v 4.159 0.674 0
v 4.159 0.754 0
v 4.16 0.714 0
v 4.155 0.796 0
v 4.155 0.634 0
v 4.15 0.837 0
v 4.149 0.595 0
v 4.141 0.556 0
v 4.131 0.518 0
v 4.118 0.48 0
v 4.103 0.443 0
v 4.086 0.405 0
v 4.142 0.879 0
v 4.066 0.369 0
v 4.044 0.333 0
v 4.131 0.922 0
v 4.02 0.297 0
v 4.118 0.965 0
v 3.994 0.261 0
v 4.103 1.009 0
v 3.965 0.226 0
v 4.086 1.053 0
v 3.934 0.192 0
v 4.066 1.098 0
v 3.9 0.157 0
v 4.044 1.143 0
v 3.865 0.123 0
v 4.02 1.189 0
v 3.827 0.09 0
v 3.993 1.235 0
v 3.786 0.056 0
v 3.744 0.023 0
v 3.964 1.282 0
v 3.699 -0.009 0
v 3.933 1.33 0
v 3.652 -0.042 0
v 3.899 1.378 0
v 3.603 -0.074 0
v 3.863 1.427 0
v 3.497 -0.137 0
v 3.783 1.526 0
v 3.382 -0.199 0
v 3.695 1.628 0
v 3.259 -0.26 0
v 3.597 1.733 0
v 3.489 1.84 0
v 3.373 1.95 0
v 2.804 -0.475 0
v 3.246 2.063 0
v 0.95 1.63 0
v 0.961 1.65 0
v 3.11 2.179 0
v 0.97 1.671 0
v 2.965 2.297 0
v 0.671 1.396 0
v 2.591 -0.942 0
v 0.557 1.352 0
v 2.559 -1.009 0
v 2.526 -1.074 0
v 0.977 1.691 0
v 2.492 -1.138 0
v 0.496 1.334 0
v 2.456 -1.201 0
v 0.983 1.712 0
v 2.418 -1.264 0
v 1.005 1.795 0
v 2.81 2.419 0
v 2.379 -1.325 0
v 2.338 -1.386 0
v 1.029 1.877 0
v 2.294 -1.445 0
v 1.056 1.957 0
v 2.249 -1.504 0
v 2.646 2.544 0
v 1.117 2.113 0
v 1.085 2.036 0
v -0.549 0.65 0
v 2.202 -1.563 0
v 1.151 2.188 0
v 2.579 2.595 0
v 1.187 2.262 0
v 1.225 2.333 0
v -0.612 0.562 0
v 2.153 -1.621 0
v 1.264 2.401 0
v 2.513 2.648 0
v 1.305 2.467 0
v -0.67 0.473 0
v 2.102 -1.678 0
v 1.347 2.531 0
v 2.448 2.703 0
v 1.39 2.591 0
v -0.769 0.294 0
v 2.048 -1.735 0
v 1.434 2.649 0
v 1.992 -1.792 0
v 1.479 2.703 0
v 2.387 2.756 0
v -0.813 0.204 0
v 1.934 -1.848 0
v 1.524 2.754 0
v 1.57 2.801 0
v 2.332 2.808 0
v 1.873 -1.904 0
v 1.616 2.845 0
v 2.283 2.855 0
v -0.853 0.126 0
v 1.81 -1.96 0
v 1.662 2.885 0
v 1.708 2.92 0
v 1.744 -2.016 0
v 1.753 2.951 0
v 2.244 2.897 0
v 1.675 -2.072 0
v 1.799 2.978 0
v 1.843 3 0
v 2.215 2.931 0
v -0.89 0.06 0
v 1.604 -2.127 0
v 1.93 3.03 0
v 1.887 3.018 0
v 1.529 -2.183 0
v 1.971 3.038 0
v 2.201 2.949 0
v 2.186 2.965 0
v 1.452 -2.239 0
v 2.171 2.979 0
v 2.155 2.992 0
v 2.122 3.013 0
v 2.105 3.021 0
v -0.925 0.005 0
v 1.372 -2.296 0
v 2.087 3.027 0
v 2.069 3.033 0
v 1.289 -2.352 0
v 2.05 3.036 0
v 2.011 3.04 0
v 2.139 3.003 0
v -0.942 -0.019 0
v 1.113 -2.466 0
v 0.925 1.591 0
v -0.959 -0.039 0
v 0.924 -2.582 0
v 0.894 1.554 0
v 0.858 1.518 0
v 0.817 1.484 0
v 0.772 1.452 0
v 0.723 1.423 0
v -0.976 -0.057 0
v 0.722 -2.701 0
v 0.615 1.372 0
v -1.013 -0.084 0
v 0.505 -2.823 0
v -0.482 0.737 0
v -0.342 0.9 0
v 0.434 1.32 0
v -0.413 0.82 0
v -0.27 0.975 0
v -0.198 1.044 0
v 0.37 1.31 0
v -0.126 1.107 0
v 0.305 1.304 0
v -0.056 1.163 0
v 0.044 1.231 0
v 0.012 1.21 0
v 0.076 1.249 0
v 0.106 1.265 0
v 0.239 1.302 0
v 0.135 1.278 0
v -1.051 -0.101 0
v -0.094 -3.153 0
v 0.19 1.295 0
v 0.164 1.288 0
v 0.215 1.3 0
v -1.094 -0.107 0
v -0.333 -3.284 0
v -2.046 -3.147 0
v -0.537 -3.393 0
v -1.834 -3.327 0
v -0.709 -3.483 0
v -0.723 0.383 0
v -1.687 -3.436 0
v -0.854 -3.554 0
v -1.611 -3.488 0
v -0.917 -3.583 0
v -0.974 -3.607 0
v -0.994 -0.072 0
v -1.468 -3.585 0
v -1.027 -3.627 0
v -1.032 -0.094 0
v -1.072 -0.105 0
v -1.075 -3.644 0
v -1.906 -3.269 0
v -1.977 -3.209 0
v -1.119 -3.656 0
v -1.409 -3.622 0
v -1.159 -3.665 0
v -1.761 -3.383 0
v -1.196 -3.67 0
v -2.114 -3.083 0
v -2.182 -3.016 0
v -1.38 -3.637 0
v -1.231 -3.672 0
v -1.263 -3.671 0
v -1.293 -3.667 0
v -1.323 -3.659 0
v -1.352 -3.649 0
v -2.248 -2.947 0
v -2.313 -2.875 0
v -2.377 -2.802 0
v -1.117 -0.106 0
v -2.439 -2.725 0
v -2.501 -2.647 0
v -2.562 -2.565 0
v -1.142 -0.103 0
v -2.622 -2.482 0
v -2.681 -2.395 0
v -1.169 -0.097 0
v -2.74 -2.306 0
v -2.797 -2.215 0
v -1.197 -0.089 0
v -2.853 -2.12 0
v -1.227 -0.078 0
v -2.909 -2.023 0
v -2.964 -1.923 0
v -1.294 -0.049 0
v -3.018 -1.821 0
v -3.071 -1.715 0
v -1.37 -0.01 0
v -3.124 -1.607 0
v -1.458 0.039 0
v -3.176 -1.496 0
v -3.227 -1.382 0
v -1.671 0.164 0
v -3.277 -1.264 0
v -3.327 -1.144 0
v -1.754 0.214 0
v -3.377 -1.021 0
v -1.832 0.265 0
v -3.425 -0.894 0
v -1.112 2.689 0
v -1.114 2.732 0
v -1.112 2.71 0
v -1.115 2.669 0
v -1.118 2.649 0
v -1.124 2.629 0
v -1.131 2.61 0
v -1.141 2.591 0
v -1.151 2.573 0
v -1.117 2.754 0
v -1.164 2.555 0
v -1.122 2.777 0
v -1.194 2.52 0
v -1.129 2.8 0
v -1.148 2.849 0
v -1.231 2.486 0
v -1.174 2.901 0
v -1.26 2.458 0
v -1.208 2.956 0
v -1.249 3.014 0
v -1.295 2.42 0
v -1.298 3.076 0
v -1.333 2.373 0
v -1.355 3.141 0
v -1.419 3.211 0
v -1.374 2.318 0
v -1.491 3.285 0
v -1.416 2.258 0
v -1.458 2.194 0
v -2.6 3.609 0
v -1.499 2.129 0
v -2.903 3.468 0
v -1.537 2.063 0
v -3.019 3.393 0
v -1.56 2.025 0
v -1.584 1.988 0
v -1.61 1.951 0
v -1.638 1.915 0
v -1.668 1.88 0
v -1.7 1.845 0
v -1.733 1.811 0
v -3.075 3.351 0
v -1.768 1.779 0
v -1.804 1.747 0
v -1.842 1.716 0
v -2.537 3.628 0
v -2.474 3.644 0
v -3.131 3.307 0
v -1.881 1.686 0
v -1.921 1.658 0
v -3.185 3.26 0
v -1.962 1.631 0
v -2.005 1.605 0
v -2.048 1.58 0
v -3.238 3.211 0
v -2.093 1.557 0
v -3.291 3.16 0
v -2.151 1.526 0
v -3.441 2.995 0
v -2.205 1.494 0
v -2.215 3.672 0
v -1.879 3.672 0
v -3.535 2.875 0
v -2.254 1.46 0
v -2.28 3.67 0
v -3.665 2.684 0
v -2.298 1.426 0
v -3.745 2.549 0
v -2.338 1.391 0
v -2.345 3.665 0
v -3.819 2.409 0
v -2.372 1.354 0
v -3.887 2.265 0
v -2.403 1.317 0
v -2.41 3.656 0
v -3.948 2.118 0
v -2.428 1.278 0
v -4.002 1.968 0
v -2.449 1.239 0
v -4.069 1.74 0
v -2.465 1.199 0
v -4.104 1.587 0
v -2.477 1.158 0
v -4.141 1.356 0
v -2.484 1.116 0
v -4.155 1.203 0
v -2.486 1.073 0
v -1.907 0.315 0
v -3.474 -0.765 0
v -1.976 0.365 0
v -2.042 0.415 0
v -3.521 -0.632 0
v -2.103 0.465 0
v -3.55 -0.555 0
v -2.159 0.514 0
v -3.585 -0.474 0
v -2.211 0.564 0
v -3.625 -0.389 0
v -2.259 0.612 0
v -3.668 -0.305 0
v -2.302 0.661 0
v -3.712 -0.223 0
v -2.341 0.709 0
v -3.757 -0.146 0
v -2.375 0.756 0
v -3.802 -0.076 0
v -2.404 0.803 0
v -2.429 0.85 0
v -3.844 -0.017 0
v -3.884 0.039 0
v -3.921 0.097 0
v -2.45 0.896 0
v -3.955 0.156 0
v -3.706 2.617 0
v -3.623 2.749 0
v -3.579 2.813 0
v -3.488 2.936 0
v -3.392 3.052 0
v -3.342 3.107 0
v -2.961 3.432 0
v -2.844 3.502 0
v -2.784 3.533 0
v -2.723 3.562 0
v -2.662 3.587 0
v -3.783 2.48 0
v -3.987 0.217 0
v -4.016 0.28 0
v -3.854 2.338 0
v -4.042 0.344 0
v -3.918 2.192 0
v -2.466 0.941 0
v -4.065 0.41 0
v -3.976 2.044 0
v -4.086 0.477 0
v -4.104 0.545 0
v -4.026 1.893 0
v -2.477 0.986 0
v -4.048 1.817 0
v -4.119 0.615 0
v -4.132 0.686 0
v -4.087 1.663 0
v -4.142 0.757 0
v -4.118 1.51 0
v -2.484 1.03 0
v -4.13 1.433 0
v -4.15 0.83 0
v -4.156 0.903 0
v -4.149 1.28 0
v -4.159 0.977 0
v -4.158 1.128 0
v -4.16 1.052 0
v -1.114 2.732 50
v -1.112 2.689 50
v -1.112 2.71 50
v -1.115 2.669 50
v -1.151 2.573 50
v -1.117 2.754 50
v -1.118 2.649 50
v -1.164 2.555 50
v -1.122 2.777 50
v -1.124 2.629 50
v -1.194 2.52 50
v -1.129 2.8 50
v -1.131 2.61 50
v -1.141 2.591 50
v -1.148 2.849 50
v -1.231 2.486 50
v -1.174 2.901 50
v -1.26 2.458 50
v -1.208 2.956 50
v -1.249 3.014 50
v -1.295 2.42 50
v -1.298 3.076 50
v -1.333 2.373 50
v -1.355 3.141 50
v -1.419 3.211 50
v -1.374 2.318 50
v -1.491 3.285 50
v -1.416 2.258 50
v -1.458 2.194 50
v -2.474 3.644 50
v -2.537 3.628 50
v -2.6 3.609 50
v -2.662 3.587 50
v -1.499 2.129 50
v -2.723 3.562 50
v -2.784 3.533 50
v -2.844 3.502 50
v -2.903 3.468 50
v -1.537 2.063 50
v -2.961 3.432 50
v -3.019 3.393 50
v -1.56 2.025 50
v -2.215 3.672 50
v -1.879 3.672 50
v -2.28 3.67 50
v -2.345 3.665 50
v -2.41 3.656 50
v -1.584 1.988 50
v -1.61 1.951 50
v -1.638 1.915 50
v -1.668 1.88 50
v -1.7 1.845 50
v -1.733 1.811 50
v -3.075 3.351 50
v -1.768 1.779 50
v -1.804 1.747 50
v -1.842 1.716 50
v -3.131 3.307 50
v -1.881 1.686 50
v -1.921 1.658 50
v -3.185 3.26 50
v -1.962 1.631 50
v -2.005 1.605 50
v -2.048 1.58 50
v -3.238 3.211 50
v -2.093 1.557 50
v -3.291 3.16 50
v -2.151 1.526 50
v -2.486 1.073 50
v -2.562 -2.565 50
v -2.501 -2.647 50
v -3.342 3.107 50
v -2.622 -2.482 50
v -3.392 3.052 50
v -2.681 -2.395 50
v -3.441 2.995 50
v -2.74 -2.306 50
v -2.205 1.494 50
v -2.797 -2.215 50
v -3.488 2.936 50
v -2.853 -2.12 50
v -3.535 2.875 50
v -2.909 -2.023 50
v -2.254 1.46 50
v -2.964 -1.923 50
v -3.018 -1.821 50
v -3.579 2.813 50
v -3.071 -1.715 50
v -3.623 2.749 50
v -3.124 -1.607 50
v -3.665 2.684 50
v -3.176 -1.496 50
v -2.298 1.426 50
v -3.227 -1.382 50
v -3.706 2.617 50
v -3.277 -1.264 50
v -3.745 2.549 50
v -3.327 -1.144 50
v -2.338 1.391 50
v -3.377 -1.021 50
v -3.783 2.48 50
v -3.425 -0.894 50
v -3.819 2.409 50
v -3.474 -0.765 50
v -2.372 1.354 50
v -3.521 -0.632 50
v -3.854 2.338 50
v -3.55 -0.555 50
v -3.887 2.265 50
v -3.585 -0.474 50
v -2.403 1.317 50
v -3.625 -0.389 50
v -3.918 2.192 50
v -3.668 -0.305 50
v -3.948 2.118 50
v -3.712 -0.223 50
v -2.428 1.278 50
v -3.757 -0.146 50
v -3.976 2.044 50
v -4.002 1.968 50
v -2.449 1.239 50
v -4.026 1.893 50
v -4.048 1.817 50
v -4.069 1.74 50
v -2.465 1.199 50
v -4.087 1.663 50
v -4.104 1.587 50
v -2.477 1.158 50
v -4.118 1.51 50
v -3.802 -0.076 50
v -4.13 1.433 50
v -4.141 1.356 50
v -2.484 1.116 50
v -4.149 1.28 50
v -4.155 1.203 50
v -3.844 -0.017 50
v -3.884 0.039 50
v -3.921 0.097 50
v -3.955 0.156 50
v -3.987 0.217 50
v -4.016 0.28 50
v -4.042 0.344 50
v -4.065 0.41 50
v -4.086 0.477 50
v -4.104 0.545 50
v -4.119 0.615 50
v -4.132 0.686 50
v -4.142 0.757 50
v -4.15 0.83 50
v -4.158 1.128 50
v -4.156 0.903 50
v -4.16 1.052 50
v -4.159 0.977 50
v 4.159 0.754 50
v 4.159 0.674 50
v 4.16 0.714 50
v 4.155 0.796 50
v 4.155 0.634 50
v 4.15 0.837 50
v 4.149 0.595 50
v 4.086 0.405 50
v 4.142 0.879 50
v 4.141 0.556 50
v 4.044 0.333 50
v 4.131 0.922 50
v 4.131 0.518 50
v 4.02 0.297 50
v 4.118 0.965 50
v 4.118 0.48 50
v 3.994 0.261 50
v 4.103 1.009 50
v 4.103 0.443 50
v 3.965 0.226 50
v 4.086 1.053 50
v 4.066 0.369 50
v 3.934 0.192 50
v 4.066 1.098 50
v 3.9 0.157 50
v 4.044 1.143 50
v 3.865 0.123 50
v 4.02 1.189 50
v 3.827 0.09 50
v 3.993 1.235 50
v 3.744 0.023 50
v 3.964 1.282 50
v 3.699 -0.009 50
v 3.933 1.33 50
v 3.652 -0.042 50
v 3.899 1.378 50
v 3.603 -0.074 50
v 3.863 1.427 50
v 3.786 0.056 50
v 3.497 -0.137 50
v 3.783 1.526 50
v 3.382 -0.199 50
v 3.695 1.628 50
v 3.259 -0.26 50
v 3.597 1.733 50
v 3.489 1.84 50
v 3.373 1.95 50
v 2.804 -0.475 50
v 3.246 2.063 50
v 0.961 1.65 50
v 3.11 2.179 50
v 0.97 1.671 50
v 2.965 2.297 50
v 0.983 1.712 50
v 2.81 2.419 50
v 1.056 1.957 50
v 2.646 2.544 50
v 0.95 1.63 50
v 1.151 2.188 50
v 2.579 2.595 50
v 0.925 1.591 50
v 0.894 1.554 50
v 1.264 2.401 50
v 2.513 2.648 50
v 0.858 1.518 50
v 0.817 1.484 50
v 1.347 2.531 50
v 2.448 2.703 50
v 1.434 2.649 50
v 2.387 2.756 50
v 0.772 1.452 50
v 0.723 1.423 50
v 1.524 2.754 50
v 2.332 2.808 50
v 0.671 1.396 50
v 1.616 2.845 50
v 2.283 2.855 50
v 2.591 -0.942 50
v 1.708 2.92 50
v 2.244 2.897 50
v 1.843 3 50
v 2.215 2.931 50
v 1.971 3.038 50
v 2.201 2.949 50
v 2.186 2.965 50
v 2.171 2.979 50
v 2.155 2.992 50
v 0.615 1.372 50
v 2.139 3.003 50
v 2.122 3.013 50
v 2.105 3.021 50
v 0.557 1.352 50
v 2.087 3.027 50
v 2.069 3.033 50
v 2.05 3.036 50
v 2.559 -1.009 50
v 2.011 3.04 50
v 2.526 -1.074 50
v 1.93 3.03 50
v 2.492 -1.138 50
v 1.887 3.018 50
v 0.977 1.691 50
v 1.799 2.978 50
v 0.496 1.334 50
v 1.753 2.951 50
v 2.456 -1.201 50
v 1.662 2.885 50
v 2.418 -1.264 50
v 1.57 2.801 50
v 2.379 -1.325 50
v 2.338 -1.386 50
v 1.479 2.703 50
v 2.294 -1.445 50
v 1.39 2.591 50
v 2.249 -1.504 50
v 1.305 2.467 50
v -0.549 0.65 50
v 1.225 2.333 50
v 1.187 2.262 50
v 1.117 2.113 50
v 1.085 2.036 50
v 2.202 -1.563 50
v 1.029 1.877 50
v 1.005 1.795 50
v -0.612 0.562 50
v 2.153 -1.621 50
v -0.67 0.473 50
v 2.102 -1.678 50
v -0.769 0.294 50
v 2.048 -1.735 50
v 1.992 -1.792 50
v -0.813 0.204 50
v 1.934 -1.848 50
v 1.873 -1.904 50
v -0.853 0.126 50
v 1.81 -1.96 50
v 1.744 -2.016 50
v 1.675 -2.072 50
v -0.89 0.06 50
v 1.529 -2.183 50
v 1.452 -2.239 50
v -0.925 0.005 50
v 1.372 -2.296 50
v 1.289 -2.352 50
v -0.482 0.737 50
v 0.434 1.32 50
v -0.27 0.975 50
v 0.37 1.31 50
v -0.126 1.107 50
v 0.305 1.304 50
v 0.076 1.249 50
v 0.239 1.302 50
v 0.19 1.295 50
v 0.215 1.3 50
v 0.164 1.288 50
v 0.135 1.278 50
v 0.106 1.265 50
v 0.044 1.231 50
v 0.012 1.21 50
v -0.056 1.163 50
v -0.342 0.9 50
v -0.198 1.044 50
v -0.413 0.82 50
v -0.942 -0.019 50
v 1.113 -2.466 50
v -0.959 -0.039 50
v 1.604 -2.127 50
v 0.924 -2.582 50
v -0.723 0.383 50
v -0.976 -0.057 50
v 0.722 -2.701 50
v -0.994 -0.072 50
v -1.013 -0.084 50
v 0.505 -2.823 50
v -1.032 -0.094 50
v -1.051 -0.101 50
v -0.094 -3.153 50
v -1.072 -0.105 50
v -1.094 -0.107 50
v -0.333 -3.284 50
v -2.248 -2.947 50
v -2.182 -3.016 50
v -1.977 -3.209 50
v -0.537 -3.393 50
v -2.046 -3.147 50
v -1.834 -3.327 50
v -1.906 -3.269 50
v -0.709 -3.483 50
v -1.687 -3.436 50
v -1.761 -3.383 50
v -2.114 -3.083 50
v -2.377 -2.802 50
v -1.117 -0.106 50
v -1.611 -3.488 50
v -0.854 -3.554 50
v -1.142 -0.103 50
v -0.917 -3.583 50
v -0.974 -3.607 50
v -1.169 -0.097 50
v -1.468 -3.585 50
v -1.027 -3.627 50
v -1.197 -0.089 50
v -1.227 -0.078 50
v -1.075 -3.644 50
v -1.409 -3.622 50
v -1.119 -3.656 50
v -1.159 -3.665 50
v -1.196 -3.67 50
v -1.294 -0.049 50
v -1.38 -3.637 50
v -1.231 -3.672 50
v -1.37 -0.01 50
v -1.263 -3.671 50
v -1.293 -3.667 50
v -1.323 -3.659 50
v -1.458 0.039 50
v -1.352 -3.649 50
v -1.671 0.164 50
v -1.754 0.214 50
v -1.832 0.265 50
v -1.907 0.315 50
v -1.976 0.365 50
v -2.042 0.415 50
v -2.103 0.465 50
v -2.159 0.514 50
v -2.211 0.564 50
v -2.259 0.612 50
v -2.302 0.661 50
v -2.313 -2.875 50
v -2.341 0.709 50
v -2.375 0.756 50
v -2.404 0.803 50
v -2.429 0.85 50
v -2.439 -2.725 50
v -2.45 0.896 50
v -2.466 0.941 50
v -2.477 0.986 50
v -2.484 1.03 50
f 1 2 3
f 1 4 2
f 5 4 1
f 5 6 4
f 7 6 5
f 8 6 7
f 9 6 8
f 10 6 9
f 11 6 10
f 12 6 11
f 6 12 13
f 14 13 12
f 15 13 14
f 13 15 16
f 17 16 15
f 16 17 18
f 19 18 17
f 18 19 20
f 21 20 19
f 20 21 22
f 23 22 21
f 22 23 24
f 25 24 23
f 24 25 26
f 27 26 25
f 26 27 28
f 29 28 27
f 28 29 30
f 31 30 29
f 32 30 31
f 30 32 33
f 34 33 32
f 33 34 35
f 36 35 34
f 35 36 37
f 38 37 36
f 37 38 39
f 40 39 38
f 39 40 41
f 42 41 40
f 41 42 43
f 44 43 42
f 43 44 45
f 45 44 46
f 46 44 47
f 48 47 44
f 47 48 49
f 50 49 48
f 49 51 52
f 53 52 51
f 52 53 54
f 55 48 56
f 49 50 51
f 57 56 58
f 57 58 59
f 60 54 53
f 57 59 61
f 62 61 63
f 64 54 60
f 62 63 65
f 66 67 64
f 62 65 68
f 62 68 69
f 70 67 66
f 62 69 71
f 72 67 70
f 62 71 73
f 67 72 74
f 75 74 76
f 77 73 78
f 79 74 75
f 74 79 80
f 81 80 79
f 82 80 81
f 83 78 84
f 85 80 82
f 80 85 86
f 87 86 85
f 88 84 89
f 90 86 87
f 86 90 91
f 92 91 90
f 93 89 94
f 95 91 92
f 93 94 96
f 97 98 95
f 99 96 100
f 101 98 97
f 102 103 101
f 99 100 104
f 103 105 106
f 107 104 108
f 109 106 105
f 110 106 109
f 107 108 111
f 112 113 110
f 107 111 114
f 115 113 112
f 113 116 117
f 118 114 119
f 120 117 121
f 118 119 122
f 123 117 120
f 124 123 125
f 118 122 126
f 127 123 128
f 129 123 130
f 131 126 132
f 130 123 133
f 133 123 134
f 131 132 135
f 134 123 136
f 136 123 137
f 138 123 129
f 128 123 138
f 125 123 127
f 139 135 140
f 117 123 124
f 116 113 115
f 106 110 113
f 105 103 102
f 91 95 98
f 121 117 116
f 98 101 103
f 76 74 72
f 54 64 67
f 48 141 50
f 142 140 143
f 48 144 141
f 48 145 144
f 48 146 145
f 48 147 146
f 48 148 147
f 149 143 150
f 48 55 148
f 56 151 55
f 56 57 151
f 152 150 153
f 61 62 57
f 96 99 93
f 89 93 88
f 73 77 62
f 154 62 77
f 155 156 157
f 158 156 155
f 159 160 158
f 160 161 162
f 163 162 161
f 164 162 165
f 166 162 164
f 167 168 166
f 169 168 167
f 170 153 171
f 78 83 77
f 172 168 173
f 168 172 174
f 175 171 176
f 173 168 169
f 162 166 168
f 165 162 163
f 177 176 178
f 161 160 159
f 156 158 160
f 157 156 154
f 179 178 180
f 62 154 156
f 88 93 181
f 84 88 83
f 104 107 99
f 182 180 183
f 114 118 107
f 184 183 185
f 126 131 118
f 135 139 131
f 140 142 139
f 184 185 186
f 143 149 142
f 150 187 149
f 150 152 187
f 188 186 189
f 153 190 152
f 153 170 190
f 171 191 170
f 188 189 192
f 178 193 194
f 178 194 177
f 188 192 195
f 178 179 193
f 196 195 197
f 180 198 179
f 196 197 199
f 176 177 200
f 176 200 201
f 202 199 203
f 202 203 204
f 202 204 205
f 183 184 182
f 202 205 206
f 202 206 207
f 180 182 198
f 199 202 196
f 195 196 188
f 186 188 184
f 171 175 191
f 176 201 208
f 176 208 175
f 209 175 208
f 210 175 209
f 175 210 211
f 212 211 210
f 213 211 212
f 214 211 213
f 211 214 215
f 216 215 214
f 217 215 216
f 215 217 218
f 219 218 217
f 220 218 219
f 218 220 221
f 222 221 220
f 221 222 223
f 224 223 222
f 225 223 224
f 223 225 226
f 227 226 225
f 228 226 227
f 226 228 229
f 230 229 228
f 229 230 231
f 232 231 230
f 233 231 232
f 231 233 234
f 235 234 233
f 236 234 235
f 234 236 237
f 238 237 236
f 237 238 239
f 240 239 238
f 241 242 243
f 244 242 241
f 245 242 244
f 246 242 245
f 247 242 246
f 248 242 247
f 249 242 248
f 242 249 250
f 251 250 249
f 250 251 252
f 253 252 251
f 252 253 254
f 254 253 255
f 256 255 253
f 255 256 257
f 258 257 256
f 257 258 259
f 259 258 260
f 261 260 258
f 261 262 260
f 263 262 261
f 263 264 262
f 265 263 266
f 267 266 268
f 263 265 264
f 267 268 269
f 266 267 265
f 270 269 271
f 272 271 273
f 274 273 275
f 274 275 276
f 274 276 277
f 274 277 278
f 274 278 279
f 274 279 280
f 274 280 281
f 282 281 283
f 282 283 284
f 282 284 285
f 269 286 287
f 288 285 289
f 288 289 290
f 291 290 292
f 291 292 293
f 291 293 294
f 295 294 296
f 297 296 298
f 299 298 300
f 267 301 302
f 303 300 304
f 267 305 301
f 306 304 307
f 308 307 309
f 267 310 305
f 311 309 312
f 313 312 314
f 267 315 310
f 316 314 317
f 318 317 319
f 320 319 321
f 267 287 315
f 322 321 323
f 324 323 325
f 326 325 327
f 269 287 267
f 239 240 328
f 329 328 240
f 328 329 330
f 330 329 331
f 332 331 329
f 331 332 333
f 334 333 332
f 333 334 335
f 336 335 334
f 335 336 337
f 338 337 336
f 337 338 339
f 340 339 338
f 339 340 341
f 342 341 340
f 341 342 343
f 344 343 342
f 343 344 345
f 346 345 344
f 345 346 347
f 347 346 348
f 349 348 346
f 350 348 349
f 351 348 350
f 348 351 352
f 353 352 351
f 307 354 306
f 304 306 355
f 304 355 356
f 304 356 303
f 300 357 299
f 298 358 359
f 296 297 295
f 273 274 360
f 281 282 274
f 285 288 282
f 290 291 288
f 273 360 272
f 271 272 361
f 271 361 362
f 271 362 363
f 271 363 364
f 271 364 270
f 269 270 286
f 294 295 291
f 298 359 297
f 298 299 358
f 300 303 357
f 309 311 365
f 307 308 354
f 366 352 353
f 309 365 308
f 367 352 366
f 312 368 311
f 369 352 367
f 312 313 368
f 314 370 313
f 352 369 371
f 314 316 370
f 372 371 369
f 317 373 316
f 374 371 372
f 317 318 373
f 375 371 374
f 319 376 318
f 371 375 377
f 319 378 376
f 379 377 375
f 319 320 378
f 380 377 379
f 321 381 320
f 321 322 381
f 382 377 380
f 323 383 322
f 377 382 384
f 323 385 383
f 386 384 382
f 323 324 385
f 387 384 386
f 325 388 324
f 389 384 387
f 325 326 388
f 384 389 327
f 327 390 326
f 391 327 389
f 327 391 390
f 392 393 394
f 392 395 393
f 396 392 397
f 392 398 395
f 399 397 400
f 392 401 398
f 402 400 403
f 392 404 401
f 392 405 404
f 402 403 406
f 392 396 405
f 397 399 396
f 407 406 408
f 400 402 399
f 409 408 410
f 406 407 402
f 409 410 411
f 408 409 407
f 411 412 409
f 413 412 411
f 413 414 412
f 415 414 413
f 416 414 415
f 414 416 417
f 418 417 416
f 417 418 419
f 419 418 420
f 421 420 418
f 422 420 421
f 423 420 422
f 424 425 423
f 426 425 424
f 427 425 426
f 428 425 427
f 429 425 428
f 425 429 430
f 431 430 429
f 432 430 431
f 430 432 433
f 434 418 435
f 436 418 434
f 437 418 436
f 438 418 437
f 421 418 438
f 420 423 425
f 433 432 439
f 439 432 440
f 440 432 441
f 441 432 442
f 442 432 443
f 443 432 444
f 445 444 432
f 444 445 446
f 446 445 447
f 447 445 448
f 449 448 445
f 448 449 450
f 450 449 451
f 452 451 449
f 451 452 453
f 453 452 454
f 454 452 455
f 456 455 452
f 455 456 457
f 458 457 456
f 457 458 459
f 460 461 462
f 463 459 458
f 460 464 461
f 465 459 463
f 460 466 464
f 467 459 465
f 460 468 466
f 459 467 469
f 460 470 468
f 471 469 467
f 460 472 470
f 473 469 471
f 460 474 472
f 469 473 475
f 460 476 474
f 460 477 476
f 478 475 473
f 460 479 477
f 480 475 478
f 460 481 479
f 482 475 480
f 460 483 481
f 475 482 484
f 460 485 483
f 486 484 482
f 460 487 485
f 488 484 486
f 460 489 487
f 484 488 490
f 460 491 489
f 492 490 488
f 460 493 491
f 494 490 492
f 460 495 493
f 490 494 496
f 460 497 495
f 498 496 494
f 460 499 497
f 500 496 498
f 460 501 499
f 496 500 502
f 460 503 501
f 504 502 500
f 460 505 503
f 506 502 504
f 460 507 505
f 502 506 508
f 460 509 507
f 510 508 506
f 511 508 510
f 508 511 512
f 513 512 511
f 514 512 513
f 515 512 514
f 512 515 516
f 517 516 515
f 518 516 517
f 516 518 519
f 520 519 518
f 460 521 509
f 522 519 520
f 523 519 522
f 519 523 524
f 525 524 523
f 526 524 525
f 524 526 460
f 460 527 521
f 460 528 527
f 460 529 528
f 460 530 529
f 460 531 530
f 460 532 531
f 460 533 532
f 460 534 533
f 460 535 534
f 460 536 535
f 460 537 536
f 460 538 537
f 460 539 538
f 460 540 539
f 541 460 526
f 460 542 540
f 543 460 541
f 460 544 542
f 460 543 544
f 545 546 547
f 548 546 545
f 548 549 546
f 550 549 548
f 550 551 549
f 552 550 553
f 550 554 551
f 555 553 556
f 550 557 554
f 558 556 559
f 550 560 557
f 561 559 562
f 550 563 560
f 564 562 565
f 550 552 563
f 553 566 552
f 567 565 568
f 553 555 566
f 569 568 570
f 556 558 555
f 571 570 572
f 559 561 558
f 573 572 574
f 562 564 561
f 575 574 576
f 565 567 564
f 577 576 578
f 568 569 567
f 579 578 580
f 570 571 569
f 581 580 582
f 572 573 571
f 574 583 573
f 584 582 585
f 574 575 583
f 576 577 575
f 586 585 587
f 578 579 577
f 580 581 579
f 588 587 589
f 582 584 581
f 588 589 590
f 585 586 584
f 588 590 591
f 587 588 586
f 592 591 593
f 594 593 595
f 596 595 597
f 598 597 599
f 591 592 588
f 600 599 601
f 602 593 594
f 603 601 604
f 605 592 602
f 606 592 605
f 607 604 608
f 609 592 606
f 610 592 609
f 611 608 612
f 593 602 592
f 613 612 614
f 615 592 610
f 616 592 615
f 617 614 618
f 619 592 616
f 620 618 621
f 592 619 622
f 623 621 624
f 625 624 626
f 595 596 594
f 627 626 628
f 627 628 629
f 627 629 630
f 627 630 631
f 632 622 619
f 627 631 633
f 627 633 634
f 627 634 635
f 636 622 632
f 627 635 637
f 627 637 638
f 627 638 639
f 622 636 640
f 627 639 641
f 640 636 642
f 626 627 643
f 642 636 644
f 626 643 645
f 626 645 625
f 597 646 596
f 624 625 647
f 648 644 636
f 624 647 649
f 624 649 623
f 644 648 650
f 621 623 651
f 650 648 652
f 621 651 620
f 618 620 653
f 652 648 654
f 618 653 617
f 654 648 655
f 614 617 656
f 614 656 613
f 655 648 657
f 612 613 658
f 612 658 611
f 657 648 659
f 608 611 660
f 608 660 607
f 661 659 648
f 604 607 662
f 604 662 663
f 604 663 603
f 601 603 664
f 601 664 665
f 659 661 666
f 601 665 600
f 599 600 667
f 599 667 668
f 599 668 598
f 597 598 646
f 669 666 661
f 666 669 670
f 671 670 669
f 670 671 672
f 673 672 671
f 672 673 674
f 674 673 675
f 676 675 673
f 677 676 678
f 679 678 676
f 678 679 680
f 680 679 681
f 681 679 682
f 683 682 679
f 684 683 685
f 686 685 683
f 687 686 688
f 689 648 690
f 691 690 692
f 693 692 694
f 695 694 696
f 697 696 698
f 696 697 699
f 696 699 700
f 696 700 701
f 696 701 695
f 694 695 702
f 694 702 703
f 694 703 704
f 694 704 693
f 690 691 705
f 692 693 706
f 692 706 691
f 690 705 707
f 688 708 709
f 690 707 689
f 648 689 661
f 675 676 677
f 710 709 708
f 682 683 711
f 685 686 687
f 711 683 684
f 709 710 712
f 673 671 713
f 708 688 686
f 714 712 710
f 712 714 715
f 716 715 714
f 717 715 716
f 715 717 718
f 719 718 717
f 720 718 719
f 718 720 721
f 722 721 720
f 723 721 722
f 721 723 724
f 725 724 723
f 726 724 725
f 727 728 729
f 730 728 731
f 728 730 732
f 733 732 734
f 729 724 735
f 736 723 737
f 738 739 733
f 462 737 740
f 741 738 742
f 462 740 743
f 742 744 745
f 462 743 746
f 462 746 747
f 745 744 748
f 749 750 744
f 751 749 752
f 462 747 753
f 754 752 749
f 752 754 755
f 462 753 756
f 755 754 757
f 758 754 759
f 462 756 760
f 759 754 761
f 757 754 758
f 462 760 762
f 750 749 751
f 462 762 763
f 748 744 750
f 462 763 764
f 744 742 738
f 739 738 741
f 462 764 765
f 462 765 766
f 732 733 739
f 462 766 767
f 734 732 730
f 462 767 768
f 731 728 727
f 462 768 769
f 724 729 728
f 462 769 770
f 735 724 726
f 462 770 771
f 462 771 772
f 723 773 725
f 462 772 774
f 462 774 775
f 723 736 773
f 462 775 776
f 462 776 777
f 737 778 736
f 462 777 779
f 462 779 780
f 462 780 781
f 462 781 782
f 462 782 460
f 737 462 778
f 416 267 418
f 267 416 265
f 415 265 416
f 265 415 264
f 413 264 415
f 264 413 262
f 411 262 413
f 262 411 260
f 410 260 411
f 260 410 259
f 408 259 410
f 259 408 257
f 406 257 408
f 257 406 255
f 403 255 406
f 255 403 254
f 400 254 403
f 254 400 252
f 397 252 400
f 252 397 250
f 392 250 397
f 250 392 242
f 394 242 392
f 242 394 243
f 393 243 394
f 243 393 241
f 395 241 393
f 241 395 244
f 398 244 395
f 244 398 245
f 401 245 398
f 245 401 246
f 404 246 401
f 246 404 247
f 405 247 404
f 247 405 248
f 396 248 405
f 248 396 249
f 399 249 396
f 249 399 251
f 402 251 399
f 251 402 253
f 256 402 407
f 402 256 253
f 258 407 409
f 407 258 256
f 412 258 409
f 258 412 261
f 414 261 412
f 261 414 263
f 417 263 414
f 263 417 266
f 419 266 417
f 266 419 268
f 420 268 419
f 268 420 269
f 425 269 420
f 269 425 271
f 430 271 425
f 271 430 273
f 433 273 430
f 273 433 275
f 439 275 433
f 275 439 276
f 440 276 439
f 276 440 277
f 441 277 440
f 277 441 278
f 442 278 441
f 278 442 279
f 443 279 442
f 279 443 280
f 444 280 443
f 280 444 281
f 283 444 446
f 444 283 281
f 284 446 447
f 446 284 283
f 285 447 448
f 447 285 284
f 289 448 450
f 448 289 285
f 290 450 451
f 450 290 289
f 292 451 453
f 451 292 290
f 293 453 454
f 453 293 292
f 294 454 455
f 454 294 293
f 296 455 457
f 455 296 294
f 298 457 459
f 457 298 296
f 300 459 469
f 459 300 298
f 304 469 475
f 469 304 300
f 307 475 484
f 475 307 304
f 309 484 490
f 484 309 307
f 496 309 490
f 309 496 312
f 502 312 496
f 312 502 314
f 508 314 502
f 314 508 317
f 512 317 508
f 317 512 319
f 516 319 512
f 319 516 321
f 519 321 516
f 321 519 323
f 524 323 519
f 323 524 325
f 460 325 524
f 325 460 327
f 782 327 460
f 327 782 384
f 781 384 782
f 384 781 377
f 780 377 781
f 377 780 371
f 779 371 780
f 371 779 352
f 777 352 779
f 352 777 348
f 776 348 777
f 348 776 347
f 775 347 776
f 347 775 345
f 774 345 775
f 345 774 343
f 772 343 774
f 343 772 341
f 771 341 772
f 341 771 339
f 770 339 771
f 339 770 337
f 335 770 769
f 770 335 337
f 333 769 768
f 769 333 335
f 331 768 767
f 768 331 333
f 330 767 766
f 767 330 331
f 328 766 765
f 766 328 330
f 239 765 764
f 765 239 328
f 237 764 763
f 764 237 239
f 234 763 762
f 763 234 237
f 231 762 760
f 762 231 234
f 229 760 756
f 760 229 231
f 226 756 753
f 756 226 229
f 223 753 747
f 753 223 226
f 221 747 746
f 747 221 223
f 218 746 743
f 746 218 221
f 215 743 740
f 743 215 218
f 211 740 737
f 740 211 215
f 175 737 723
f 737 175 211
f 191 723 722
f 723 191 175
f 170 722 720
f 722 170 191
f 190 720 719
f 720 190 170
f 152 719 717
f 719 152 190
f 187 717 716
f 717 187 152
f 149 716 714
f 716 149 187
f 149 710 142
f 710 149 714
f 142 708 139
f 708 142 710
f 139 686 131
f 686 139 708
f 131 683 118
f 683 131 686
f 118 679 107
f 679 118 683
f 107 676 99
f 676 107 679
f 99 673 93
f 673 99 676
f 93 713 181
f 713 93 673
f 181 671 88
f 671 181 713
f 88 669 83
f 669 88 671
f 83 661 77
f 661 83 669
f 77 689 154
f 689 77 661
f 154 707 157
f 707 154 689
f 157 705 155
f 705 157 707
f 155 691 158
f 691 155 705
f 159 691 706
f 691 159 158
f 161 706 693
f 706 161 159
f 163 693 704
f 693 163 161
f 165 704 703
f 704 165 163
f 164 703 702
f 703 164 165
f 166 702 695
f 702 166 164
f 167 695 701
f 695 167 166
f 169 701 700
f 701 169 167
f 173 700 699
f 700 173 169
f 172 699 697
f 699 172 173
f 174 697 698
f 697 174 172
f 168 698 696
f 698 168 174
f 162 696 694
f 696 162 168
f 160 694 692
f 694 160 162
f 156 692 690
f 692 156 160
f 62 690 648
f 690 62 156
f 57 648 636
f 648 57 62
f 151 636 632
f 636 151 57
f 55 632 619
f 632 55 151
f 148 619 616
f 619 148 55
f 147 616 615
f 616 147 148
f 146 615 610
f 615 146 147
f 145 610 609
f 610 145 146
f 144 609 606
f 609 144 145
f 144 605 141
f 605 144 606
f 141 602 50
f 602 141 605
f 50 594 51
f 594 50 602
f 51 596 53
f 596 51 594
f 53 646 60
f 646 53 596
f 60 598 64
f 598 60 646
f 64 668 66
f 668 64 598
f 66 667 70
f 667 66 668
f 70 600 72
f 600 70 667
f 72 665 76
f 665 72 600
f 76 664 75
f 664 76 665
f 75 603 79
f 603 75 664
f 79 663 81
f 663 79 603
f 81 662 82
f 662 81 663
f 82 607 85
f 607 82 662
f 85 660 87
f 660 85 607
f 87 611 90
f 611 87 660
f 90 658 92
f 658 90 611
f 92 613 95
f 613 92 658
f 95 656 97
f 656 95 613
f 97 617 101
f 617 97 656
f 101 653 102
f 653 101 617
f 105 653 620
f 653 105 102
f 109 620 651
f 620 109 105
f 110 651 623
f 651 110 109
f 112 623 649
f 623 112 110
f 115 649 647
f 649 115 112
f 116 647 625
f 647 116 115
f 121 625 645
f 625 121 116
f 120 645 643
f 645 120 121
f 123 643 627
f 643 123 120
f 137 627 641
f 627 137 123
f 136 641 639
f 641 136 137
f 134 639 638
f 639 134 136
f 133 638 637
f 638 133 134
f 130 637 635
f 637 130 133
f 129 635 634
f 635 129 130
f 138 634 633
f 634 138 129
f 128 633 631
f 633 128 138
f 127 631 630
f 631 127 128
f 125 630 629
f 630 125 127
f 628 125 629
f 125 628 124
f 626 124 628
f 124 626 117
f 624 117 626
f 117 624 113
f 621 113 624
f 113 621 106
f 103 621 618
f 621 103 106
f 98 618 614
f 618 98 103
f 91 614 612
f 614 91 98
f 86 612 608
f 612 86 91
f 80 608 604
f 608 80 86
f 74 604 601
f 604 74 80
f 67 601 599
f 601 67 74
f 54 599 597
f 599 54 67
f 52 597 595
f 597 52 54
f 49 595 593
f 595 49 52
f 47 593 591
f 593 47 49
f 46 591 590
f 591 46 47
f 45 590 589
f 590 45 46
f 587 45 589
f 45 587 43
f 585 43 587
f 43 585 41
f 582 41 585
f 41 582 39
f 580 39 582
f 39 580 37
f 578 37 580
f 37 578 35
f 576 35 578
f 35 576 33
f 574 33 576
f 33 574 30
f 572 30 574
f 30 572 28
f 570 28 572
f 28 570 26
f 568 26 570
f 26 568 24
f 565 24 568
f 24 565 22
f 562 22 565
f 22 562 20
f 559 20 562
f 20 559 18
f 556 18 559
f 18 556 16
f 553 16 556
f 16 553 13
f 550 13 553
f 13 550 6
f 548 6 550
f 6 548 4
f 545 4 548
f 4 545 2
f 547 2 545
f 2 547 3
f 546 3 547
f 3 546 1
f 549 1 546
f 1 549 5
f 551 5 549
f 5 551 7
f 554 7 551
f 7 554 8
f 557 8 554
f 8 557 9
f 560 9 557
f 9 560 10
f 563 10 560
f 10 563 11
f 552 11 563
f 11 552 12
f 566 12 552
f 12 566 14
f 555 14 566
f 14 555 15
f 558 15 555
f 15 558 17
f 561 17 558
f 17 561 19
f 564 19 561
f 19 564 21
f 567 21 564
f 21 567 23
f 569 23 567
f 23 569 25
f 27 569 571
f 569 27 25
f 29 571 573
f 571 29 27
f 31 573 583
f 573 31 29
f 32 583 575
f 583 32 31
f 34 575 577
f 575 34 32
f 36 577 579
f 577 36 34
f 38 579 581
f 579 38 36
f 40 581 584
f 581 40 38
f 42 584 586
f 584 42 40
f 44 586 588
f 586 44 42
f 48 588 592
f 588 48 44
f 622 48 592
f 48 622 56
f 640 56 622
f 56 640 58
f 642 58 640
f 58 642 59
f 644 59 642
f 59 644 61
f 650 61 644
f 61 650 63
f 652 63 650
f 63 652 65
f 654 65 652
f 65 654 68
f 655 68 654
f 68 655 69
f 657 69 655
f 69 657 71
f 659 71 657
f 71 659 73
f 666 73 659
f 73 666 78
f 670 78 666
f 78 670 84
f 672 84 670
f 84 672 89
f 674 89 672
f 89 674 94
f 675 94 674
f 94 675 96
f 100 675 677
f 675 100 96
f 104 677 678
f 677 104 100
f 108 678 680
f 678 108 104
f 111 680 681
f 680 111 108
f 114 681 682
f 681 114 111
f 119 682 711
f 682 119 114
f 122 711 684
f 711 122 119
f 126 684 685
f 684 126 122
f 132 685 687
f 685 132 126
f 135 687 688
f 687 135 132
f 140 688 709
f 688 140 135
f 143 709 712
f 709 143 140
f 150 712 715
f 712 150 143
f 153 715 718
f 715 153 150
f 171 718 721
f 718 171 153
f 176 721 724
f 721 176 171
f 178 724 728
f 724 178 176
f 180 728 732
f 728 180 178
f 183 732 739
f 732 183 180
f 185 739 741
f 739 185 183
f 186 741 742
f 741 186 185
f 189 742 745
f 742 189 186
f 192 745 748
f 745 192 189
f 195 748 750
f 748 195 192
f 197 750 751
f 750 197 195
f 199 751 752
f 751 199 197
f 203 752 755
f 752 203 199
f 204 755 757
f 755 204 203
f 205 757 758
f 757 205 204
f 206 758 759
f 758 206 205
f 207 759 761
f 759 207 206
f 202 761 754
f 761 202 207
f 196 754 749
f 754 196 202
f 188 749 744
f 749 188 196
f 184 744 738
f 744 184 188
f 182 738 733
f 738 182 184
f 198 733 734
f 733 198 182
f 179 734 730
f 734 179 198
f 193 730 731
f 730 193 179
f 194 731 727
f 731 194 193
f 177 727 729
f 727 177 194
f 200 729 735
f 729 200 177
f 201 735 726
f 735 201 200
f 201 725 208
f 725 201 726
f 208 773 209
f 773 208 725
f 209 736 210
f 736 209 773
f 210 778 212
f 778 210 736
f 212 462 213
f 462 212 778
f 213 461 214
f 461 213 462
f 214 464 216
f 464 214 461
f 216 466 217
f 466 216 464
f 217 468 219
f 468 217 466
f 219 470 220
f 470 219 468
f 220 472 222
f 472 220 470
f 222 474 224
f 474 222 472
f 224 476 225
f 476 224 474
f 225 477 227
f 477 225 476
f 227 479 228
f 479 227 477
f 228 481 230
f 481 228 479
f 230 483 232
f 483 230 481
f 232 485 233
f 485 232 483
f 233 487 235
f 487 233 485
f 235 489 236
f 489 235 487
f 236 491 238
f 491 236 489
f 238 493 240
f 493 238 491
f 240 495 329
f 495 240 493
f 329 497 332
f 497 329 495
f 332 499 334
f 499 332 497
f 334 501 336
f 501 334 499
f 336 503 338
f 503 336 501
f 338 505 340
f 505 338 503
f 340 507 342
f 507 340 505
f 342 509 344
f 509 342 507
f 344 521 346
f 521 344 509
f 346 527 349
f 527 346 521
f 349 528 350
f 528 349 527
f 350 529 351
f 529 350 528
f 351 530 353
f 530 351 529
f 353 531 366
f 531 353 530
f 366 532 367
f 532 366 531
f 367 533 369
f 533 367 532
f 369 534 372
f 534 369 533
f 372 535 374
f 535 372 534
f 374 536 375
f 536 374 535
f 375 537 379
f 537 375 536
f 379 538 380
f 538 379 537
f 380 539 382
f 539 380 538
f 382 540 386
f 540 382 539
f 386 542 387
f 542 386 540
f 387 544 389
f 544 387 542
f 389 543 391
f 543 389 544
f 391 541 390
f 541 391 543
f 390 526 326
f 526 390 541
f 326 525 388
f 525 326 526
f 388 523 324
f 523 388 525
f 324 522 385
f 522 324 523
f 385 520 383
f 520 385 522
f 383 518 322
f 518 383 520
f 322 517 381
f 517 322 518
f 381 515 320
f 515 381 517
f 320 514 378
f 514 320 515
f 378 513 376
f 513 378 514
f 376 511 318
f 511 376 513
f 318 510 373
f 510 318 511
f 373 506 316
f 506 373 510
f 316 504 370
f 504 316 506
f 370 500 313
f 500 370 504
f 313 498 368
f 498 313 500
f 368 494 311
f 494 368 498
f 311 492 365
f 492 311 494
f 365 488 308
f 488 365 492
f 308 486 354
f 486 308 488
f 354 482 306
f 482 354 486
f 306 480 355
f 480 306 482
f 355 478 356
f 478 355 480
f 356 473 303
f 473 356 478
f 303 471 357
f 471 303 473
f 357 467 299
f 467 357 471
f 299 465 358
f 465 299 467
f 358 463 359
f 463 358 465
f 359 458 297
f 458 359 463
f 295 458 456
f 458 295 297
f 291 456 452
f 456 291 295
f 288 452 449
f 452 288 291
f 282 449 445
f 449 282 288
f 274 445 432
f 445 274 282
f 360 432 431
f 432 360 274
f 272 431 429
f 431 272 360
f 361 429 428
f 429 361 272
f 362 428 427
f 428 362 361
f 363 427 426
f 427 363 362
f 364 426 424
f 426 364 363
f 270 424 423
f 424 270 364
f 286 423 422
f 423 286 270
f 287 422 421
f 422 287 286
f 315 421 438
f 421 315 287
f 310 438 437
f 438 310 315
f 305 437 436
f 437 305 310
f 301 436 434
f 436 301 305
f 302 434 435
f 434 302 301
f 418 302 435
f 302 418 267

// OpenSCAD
// Generated by inkscape None + inkscape-paths2openscad 0.27
// Sat Sep 26 10:11:46 2020 from "inkscape.svg"

// Module names are of the form poly_<inkscape-path-id>().  As a result,
// you can associate a polygon in this OpenSCAD program with the corresponding
// SVG element in the Inkscape document by looking for the XML element with
// the attribute id="inkscape-path-id".

// fudge value is used to ensure that subtracted solids are a tad taller
// in the z dimension than the polygon being subtracted from.  This helps
// keep the resulting .stl file manifold.
fudge = 0.1;
user_unit_scale_x = 1.0;
user_unit_scale_y = 1.0;
custom_scale_x = 1;
custom_scale_y = 1;
zsize = 50;
line_fn = 16;
min_line_width = 1.0;
line_width_scale = 1.0;
function min_line_mm(w) = max(min_line_width, w * line_width_scale) * 1;


path963_0_center = [0.000000,0.000000];
path963_0_points = [[-1.611385,3.487564],[-1.686929,3.436089],[-1.761202,3.382547],[-1.834231,3.326901],[-1.906038,3.269114],[-1.976650,3.209150],[-2.046090,3.146971],[-2.114383,3.082540],[-2.181555,3.015821],[-2.247629,2.946777],[-2.312630,2.875371],[-2.376583,2.801566],[-2.439513,2.725324],[-2.501444,2.646611],[-2.562401,2.565387],[-2.622409,2.481618],[-2.681491,2.395264],[-2.739674,2.306291],[-2.796982,2.214661],[-2.853438,2.120337],[-2.909069,2.023282],[-2.963898,1.923459],[-3.017950,1.820832],[-3.071250,1.715363],[-3.123823,1.607016],[-3.175692,1.495754],[-3.226884,1.381540],[-3.277423,1.264337],[-3.327332,1.144109],[-3.376637,1.020818],[-3.425363,0.894427],[-3.473534,0.764900],[-3.521175,0.632200],[-3.550404,0.555424],[-3.585456,0.473548],[-3.625006,0.389097],[-3.667730,0.304596],[-3.712303,0.222569],[-3.757400,0.145542],[-3.801696,0.076040],[-3.843865,0.016587],[-3.883921,-0.039096],[-3.921087,-0.096674],[-3.955404,-0.156060],[-3.986909,-0.217164],[-4.015642,-0.279897],[-4.041643,-0.344171],[-4.064950,-0.409897],[-4.085604,-0.476987],[-4.103642,-0.545351],[-4.119104,-0.614901],[-4.132029,-0.685548],[-4.142457,-0.757204],[-4.150427,-0.829780],[-4.155977,-0.903186],[-4.159148,-0.977335],[-4.159977,-1.052138],[-4.158505,-1.127505],[-4.154771,-1.203348],[-4.148813,-1.279579],[-4.140671,-1.356109],[-4.130384,-1.432848],[-4.117992,-1.509709],[-4.103533,-1.586602],[-4.087046,-1.663439],[-4.068572,-1.740131],[-4.048148,-1.816589],[-4.025815,-1.892725],[-4.001611,-1.968449],[-3.975575,-2.043674],[-3.947747,-2.118310],[-3.918166,-2.192269],[-3.886871,-2.265462],[-3.853902,-2.337800],[-3.819297,-2.409195],[-3.783095,-2.479557],[-3.745336,-2.548799],[-3.706059,-2.616830],[-3.665304,-2.683564],[-3.623108,-2.748910],[-3.579513,-2.812780],[-3.534555,-2.875086],[-3.488276,-2.935739],[-3.440714,-2.994649],[-3.391908,-3.051729],[-3.341897,-3.106889],[-3.290722,-3.160041],[-3.238419,-3.211096],[-3.185030,-3.259966],[-3.130593,-3.306561],[-3.075147,-3.350793],[-3.018732,-3.392573],[-2.961386,-3.431813],[-2.903150,-3.468423],[-2.844061,-3.502315],[-2.784159,-3.533401],[-2.723484,-3.561591],[-2.662075,-3.586797],[-2.599970,-3.608930],[-2.537209,-3.627901],[-2.473831,-3.643622],[-2.409876,-3.656004],[-2.345382,-3.664958],[-2.280389,-3.670395],[-2.214935,-3.672227],[-1.878755,-3.672227],[-1.491065,-3.284543],[-1.419050,-3.210804],[-1.354813,-3.141295],[-1.298281,-3.075790],[-1.249380,-3.014064],[-1.208037,-2.955893],[-1.174179,-2.901052],[-1.147732,-2.849315],[-1.128624,-2.800457],[-1.121799,-2.777038],[-1.116781,-2.754254],[-1.113561,-2.732078],[-1.112129,-2.710480],[-1.112477,-2.689434],[-1.114596,-2.668911],[-1.118476,-2.648883],[-1.124109,-2.629322],[-1.131484,-2.610199],[-1.140593,-2.591486],[-1.151427,-2.573156],[-1.163976,-2.555180],[-1.194184,-2.520179],[-1.231145,-2.486257],[-1.260463,-2.458474],[-1.294853,-2.420023],[-1.333061,-2.372641],[-1.373831,-2.318067],[-1.415909,-2.258038],[-1.458039,-2.194291],[-1.498966,-2.128565],[-1.537435,-2.062596],[-1.559798,-2.024844],[-1.584137,-1.987611],[-1.610383,-1.950960],[-1.638465,-1.914956],[-1.668313,-1.879662],[-1.699856,-1.845142],[-1.733026,-1.811461],[-1.767750,-1.778682],[-1.803960,-1.746870],[-1.841584,-1.716087],[-1.880553,-1.686399],[-1.920796,-1.657869],[-1.962243,-1.630562],[-2.004824,-1.604540],[-2.048468,-1.579868],[-2.093105,-1.556610],[-2.151447,-1.525693],[-2.205064,-1.493603],[-2.253968,-1.460375],[-2.298168,-1.426046],[-2.337676,-1.390652],[-2.372504,-1.354229],[-2.402661,-1.316812],[-2.428159,-1.278438],[-2.449009,-1.239142],[-2.465221,-1.198961],[-2.476807,-1.157931],[-2.483777,-1.116087],[-2.486142,-1.073465],[-2.483914,-1.030102],[-2.477102,-0.986033],[-2.465719,-0.941295],[-2.449775,-0.895923],[-2.429280,-0.849953],[-2.404246,-0.803421],[-2.374684,-0.756364],[-2.340604,-0.708817],[-2.302018,-0.660815],[-2.258936,-0.612396],[-2.211369,-0.563595],[-2.159329,-0.514448],[-2.102826,-0.464991],[-2.041870,-0.415259],[-1.976474,-0.365290],[-1.906647,-0.315118],[-1.832401,-0.264781],[-1.753747,-0.214313],[-1.670695,-0.163750],[-1.457653,-0.038913],[-1.370173,0.009584],[-1.293689,0.048554],[-1.226923,0.077812],[-1.196787,0.088742],[-1.168602,0.097175],[-1.142210,0.103088],[-1.117451,0.106457],[-1.094165,0.107261],[-1.072193,0.105476],[-1.051376,0.101079],[-1.031554,0.094047],[-1.012568,0.084356],[-0.994258,0.071985],[-0.976466,0.056909],[-0.959031,0.039106],[-0.941795,0.018553],[-0.924598,-0.004774],[-0.889683,-0.059839],[-0.853011,-0.126273],[-0.813307,-0.204261],[-0.769295,-0.293987],[-0.722799,-0.382979],[-0.669988,-0.472610],[-0.611745,-0.562001],[-0.548951,-0.650271],[-0.482486,-0.736539],[-0.413232,-0.819925],[-0.342070,-0.899549],[-0.269880,-0.974530],[-0.197544,-1.043987],[-0.125943,-1.107040],[-0.055958,-1.162808],[0.011531,-1.210411],[0.044063,-1.230876],[0.075641,-1.248969],[0.106154,-1.264580],[0.135493,-1.277600],[0.163546,-1.287918],[0.190204,-1.295424],[0.215357,-1.300009],[0.238895,-1.301561],[0.304756,-1.303712],[0.369890,-1.310018],[0.433898,-1.320260],[0.496386,-1.334221],[0.556956,-1.351681],[0.615213,-1.372421],[0.670759,-1.396225],[0.723200,-1.422871],[0.772138,-1.452143],[0.817177,-1.483822],[0.857921,-1.517688],[0.893974,-1.553524],[0.924939,-1.591111],[0.950420,-1.630229],[0.960980,-1.650295],[0.970021,-1.670661],[0.977492,-1.691302],[0.983345,-1.712188],[1.004772,-1.795008],[1.029043,-1.876666],[1.055981,-1.956991],[1.085414,-2.035810],[1.117167,-2.112951],[1.151066,-2.188242],[1.186937,-2.261509],[1.224605,-2.332581],[1.263897,-2.401285],[1.304637,-2.467449],[1.346653,-2.530900],[1.389769,-2.591466],[1.433812,-2.648974],[1.478607,-2.703252],[1.523980,-2.754127],[1.569757,-2.801428],[1.615764,-2.844981],[1.661827,-2.884615],[1.707771,-2.920156],[1.753422,-2.951433],[1.798605,-2.978273],[1.843148,-3.000503],[1.886876,-3.017952],[1.929613,-3.030446],[1.971187,-3.037813],[2.011423,-3.039881],[2.050147,-3.036477],[2.068887,-3.032670],[2.087184,-3.027430],[2.105016,-3.020736],[2.122360,-3.012566],[2.139197,-3.002899],[2.155502,-2.991713],[2.171256,-2.978987],[2.186435,-2.964698],[2.201019,-2.948827],[2.214985,-2.931350],[2.243734,-2.896693],[2.283200,-2.854920],[2.331616,-2.807621],[2.387210,-2.756385],[2.448213,-2.702801],[2.512857,-2.648458],[2.579370,-2.594946],[2.645985,-2.543854],[2.810297,-2.419133],[2.965093,-2.297490],[3.110389,-2.178856],[3.246201,-2.063162],[3.372541,-1.950341],[3.489427,-1.840323],[3.596872,-1.733041],[3.694891,-1.628426],[3.783500,-1.526409],[3.862714,-1.426922],[3.898802,-1.378105],[3.932547,-1.329896],[3.963950,-1.282285],[3.993014,-1.235263],[4.019740,-1.188822],[4.044131,-1.142955],[4.066187,-1.097651],[4.085911,-1.052902],[4.103306,-1.008701],[4.118372,-0.965038],[4.131111,-0.921904],[4.141526,-0.879292],[4.149618,-0.837192],[4.155390,-0.795597],[4.158842,-0.754497],[4.159977,-0.713884],[4.158797,-0.673749],[4.155304,-0.634084],[4.149499,-0.594881],[4.141385,-0.556130],[4.130963,-0.517824],[4.118235,-0.479953],[4.103203,-0.442509],[4.085868,-0.405484],[4.066234,-0.368869],[4.044301,-0.332655],[4.020072,-0.296834],[3.993548,-0.261397],[3.964731,-0.226336],[3.933623,-0.191642],[3.900226,-0.157306],[3.864542,-0.123321],[3.826573,-0.089677],[3.786320,-0.056366],[3.743786,-0.023379],[3.698972,0.009291],[3.651880,0.041655],[3.602512,0.073720],[3.496956,0.136988],[3.382319,0.199163],[3.258615,0.260316],[2.804235,0.475276],[2.590535,0.942055],[2.559118,1.008547],[2.526249,1.073886],[2.491857,1.138138],[2.455867,1.201368],[2.418208,1.263642],[2.378808,1.325024],[2.337592,1.385581],[2.294490,1.445378],[2.249429,1.504480],[2.202335,1.562953],[2.153137,1.620861],[2.101761,1.678272],[2.048135,1.735249],[1.992188,1.791859],[1.933845,1.848167],[1.873035,1.904238],[1.809685,1.960138],[1.743722,2.015932],[1.675074,2.071685],[1.603668,2.127464],[1.529432,2.183333],[1.452293,2.239359],[1.372179,2.295605],[1.289017,2.352139],[1.113258,2.466328],[0.924437,2.582449],[0.721973,2.701027],[0.505285,2.822584],[-0.094133,3.152913],[-0.333216,3.283816],[-0.536960,3.393473],[-0.709171,3.483079],[-0.853658,3.553832],[-0.916695,3.582512],[-0.974229,3.606927],[-1.026735,3.627226],[-1.074690,3.643560],[-1.118570,3.656077],[-1.158850,3.664928],[-1.196008,3.670262],[-1.230517,3.672227],[-1.262855,3.670975],[-1.293498,3.666654],[-1.322921,3.659414],[-1.351601,3.649404],[-1.380013,3.636774],[-1.408633,3.621674],[-1.468403,3.584659],[-1.611385,3.487564],[-1.611385,3.487564]];
module poly_path963(h, w, s, res=line_fn)
{
  scale([custom_scale_x, -custom_scale_y, 1]) union()
  {
    translate (path963_0_center) linear_extrude(height=h, convexity=10, scale=0.01*s)
      translate (-path963_0_center) polygon(path963_0_points);
  }
}

module strengthen(h)
{
  difference()
  {
    union()
    {
      translate ([0,0,0]) poly_path963(h, min_line_mm(0.999998), 100.0);
    }
    union()
    {
    }
  }
}

strengthen(zsize);
